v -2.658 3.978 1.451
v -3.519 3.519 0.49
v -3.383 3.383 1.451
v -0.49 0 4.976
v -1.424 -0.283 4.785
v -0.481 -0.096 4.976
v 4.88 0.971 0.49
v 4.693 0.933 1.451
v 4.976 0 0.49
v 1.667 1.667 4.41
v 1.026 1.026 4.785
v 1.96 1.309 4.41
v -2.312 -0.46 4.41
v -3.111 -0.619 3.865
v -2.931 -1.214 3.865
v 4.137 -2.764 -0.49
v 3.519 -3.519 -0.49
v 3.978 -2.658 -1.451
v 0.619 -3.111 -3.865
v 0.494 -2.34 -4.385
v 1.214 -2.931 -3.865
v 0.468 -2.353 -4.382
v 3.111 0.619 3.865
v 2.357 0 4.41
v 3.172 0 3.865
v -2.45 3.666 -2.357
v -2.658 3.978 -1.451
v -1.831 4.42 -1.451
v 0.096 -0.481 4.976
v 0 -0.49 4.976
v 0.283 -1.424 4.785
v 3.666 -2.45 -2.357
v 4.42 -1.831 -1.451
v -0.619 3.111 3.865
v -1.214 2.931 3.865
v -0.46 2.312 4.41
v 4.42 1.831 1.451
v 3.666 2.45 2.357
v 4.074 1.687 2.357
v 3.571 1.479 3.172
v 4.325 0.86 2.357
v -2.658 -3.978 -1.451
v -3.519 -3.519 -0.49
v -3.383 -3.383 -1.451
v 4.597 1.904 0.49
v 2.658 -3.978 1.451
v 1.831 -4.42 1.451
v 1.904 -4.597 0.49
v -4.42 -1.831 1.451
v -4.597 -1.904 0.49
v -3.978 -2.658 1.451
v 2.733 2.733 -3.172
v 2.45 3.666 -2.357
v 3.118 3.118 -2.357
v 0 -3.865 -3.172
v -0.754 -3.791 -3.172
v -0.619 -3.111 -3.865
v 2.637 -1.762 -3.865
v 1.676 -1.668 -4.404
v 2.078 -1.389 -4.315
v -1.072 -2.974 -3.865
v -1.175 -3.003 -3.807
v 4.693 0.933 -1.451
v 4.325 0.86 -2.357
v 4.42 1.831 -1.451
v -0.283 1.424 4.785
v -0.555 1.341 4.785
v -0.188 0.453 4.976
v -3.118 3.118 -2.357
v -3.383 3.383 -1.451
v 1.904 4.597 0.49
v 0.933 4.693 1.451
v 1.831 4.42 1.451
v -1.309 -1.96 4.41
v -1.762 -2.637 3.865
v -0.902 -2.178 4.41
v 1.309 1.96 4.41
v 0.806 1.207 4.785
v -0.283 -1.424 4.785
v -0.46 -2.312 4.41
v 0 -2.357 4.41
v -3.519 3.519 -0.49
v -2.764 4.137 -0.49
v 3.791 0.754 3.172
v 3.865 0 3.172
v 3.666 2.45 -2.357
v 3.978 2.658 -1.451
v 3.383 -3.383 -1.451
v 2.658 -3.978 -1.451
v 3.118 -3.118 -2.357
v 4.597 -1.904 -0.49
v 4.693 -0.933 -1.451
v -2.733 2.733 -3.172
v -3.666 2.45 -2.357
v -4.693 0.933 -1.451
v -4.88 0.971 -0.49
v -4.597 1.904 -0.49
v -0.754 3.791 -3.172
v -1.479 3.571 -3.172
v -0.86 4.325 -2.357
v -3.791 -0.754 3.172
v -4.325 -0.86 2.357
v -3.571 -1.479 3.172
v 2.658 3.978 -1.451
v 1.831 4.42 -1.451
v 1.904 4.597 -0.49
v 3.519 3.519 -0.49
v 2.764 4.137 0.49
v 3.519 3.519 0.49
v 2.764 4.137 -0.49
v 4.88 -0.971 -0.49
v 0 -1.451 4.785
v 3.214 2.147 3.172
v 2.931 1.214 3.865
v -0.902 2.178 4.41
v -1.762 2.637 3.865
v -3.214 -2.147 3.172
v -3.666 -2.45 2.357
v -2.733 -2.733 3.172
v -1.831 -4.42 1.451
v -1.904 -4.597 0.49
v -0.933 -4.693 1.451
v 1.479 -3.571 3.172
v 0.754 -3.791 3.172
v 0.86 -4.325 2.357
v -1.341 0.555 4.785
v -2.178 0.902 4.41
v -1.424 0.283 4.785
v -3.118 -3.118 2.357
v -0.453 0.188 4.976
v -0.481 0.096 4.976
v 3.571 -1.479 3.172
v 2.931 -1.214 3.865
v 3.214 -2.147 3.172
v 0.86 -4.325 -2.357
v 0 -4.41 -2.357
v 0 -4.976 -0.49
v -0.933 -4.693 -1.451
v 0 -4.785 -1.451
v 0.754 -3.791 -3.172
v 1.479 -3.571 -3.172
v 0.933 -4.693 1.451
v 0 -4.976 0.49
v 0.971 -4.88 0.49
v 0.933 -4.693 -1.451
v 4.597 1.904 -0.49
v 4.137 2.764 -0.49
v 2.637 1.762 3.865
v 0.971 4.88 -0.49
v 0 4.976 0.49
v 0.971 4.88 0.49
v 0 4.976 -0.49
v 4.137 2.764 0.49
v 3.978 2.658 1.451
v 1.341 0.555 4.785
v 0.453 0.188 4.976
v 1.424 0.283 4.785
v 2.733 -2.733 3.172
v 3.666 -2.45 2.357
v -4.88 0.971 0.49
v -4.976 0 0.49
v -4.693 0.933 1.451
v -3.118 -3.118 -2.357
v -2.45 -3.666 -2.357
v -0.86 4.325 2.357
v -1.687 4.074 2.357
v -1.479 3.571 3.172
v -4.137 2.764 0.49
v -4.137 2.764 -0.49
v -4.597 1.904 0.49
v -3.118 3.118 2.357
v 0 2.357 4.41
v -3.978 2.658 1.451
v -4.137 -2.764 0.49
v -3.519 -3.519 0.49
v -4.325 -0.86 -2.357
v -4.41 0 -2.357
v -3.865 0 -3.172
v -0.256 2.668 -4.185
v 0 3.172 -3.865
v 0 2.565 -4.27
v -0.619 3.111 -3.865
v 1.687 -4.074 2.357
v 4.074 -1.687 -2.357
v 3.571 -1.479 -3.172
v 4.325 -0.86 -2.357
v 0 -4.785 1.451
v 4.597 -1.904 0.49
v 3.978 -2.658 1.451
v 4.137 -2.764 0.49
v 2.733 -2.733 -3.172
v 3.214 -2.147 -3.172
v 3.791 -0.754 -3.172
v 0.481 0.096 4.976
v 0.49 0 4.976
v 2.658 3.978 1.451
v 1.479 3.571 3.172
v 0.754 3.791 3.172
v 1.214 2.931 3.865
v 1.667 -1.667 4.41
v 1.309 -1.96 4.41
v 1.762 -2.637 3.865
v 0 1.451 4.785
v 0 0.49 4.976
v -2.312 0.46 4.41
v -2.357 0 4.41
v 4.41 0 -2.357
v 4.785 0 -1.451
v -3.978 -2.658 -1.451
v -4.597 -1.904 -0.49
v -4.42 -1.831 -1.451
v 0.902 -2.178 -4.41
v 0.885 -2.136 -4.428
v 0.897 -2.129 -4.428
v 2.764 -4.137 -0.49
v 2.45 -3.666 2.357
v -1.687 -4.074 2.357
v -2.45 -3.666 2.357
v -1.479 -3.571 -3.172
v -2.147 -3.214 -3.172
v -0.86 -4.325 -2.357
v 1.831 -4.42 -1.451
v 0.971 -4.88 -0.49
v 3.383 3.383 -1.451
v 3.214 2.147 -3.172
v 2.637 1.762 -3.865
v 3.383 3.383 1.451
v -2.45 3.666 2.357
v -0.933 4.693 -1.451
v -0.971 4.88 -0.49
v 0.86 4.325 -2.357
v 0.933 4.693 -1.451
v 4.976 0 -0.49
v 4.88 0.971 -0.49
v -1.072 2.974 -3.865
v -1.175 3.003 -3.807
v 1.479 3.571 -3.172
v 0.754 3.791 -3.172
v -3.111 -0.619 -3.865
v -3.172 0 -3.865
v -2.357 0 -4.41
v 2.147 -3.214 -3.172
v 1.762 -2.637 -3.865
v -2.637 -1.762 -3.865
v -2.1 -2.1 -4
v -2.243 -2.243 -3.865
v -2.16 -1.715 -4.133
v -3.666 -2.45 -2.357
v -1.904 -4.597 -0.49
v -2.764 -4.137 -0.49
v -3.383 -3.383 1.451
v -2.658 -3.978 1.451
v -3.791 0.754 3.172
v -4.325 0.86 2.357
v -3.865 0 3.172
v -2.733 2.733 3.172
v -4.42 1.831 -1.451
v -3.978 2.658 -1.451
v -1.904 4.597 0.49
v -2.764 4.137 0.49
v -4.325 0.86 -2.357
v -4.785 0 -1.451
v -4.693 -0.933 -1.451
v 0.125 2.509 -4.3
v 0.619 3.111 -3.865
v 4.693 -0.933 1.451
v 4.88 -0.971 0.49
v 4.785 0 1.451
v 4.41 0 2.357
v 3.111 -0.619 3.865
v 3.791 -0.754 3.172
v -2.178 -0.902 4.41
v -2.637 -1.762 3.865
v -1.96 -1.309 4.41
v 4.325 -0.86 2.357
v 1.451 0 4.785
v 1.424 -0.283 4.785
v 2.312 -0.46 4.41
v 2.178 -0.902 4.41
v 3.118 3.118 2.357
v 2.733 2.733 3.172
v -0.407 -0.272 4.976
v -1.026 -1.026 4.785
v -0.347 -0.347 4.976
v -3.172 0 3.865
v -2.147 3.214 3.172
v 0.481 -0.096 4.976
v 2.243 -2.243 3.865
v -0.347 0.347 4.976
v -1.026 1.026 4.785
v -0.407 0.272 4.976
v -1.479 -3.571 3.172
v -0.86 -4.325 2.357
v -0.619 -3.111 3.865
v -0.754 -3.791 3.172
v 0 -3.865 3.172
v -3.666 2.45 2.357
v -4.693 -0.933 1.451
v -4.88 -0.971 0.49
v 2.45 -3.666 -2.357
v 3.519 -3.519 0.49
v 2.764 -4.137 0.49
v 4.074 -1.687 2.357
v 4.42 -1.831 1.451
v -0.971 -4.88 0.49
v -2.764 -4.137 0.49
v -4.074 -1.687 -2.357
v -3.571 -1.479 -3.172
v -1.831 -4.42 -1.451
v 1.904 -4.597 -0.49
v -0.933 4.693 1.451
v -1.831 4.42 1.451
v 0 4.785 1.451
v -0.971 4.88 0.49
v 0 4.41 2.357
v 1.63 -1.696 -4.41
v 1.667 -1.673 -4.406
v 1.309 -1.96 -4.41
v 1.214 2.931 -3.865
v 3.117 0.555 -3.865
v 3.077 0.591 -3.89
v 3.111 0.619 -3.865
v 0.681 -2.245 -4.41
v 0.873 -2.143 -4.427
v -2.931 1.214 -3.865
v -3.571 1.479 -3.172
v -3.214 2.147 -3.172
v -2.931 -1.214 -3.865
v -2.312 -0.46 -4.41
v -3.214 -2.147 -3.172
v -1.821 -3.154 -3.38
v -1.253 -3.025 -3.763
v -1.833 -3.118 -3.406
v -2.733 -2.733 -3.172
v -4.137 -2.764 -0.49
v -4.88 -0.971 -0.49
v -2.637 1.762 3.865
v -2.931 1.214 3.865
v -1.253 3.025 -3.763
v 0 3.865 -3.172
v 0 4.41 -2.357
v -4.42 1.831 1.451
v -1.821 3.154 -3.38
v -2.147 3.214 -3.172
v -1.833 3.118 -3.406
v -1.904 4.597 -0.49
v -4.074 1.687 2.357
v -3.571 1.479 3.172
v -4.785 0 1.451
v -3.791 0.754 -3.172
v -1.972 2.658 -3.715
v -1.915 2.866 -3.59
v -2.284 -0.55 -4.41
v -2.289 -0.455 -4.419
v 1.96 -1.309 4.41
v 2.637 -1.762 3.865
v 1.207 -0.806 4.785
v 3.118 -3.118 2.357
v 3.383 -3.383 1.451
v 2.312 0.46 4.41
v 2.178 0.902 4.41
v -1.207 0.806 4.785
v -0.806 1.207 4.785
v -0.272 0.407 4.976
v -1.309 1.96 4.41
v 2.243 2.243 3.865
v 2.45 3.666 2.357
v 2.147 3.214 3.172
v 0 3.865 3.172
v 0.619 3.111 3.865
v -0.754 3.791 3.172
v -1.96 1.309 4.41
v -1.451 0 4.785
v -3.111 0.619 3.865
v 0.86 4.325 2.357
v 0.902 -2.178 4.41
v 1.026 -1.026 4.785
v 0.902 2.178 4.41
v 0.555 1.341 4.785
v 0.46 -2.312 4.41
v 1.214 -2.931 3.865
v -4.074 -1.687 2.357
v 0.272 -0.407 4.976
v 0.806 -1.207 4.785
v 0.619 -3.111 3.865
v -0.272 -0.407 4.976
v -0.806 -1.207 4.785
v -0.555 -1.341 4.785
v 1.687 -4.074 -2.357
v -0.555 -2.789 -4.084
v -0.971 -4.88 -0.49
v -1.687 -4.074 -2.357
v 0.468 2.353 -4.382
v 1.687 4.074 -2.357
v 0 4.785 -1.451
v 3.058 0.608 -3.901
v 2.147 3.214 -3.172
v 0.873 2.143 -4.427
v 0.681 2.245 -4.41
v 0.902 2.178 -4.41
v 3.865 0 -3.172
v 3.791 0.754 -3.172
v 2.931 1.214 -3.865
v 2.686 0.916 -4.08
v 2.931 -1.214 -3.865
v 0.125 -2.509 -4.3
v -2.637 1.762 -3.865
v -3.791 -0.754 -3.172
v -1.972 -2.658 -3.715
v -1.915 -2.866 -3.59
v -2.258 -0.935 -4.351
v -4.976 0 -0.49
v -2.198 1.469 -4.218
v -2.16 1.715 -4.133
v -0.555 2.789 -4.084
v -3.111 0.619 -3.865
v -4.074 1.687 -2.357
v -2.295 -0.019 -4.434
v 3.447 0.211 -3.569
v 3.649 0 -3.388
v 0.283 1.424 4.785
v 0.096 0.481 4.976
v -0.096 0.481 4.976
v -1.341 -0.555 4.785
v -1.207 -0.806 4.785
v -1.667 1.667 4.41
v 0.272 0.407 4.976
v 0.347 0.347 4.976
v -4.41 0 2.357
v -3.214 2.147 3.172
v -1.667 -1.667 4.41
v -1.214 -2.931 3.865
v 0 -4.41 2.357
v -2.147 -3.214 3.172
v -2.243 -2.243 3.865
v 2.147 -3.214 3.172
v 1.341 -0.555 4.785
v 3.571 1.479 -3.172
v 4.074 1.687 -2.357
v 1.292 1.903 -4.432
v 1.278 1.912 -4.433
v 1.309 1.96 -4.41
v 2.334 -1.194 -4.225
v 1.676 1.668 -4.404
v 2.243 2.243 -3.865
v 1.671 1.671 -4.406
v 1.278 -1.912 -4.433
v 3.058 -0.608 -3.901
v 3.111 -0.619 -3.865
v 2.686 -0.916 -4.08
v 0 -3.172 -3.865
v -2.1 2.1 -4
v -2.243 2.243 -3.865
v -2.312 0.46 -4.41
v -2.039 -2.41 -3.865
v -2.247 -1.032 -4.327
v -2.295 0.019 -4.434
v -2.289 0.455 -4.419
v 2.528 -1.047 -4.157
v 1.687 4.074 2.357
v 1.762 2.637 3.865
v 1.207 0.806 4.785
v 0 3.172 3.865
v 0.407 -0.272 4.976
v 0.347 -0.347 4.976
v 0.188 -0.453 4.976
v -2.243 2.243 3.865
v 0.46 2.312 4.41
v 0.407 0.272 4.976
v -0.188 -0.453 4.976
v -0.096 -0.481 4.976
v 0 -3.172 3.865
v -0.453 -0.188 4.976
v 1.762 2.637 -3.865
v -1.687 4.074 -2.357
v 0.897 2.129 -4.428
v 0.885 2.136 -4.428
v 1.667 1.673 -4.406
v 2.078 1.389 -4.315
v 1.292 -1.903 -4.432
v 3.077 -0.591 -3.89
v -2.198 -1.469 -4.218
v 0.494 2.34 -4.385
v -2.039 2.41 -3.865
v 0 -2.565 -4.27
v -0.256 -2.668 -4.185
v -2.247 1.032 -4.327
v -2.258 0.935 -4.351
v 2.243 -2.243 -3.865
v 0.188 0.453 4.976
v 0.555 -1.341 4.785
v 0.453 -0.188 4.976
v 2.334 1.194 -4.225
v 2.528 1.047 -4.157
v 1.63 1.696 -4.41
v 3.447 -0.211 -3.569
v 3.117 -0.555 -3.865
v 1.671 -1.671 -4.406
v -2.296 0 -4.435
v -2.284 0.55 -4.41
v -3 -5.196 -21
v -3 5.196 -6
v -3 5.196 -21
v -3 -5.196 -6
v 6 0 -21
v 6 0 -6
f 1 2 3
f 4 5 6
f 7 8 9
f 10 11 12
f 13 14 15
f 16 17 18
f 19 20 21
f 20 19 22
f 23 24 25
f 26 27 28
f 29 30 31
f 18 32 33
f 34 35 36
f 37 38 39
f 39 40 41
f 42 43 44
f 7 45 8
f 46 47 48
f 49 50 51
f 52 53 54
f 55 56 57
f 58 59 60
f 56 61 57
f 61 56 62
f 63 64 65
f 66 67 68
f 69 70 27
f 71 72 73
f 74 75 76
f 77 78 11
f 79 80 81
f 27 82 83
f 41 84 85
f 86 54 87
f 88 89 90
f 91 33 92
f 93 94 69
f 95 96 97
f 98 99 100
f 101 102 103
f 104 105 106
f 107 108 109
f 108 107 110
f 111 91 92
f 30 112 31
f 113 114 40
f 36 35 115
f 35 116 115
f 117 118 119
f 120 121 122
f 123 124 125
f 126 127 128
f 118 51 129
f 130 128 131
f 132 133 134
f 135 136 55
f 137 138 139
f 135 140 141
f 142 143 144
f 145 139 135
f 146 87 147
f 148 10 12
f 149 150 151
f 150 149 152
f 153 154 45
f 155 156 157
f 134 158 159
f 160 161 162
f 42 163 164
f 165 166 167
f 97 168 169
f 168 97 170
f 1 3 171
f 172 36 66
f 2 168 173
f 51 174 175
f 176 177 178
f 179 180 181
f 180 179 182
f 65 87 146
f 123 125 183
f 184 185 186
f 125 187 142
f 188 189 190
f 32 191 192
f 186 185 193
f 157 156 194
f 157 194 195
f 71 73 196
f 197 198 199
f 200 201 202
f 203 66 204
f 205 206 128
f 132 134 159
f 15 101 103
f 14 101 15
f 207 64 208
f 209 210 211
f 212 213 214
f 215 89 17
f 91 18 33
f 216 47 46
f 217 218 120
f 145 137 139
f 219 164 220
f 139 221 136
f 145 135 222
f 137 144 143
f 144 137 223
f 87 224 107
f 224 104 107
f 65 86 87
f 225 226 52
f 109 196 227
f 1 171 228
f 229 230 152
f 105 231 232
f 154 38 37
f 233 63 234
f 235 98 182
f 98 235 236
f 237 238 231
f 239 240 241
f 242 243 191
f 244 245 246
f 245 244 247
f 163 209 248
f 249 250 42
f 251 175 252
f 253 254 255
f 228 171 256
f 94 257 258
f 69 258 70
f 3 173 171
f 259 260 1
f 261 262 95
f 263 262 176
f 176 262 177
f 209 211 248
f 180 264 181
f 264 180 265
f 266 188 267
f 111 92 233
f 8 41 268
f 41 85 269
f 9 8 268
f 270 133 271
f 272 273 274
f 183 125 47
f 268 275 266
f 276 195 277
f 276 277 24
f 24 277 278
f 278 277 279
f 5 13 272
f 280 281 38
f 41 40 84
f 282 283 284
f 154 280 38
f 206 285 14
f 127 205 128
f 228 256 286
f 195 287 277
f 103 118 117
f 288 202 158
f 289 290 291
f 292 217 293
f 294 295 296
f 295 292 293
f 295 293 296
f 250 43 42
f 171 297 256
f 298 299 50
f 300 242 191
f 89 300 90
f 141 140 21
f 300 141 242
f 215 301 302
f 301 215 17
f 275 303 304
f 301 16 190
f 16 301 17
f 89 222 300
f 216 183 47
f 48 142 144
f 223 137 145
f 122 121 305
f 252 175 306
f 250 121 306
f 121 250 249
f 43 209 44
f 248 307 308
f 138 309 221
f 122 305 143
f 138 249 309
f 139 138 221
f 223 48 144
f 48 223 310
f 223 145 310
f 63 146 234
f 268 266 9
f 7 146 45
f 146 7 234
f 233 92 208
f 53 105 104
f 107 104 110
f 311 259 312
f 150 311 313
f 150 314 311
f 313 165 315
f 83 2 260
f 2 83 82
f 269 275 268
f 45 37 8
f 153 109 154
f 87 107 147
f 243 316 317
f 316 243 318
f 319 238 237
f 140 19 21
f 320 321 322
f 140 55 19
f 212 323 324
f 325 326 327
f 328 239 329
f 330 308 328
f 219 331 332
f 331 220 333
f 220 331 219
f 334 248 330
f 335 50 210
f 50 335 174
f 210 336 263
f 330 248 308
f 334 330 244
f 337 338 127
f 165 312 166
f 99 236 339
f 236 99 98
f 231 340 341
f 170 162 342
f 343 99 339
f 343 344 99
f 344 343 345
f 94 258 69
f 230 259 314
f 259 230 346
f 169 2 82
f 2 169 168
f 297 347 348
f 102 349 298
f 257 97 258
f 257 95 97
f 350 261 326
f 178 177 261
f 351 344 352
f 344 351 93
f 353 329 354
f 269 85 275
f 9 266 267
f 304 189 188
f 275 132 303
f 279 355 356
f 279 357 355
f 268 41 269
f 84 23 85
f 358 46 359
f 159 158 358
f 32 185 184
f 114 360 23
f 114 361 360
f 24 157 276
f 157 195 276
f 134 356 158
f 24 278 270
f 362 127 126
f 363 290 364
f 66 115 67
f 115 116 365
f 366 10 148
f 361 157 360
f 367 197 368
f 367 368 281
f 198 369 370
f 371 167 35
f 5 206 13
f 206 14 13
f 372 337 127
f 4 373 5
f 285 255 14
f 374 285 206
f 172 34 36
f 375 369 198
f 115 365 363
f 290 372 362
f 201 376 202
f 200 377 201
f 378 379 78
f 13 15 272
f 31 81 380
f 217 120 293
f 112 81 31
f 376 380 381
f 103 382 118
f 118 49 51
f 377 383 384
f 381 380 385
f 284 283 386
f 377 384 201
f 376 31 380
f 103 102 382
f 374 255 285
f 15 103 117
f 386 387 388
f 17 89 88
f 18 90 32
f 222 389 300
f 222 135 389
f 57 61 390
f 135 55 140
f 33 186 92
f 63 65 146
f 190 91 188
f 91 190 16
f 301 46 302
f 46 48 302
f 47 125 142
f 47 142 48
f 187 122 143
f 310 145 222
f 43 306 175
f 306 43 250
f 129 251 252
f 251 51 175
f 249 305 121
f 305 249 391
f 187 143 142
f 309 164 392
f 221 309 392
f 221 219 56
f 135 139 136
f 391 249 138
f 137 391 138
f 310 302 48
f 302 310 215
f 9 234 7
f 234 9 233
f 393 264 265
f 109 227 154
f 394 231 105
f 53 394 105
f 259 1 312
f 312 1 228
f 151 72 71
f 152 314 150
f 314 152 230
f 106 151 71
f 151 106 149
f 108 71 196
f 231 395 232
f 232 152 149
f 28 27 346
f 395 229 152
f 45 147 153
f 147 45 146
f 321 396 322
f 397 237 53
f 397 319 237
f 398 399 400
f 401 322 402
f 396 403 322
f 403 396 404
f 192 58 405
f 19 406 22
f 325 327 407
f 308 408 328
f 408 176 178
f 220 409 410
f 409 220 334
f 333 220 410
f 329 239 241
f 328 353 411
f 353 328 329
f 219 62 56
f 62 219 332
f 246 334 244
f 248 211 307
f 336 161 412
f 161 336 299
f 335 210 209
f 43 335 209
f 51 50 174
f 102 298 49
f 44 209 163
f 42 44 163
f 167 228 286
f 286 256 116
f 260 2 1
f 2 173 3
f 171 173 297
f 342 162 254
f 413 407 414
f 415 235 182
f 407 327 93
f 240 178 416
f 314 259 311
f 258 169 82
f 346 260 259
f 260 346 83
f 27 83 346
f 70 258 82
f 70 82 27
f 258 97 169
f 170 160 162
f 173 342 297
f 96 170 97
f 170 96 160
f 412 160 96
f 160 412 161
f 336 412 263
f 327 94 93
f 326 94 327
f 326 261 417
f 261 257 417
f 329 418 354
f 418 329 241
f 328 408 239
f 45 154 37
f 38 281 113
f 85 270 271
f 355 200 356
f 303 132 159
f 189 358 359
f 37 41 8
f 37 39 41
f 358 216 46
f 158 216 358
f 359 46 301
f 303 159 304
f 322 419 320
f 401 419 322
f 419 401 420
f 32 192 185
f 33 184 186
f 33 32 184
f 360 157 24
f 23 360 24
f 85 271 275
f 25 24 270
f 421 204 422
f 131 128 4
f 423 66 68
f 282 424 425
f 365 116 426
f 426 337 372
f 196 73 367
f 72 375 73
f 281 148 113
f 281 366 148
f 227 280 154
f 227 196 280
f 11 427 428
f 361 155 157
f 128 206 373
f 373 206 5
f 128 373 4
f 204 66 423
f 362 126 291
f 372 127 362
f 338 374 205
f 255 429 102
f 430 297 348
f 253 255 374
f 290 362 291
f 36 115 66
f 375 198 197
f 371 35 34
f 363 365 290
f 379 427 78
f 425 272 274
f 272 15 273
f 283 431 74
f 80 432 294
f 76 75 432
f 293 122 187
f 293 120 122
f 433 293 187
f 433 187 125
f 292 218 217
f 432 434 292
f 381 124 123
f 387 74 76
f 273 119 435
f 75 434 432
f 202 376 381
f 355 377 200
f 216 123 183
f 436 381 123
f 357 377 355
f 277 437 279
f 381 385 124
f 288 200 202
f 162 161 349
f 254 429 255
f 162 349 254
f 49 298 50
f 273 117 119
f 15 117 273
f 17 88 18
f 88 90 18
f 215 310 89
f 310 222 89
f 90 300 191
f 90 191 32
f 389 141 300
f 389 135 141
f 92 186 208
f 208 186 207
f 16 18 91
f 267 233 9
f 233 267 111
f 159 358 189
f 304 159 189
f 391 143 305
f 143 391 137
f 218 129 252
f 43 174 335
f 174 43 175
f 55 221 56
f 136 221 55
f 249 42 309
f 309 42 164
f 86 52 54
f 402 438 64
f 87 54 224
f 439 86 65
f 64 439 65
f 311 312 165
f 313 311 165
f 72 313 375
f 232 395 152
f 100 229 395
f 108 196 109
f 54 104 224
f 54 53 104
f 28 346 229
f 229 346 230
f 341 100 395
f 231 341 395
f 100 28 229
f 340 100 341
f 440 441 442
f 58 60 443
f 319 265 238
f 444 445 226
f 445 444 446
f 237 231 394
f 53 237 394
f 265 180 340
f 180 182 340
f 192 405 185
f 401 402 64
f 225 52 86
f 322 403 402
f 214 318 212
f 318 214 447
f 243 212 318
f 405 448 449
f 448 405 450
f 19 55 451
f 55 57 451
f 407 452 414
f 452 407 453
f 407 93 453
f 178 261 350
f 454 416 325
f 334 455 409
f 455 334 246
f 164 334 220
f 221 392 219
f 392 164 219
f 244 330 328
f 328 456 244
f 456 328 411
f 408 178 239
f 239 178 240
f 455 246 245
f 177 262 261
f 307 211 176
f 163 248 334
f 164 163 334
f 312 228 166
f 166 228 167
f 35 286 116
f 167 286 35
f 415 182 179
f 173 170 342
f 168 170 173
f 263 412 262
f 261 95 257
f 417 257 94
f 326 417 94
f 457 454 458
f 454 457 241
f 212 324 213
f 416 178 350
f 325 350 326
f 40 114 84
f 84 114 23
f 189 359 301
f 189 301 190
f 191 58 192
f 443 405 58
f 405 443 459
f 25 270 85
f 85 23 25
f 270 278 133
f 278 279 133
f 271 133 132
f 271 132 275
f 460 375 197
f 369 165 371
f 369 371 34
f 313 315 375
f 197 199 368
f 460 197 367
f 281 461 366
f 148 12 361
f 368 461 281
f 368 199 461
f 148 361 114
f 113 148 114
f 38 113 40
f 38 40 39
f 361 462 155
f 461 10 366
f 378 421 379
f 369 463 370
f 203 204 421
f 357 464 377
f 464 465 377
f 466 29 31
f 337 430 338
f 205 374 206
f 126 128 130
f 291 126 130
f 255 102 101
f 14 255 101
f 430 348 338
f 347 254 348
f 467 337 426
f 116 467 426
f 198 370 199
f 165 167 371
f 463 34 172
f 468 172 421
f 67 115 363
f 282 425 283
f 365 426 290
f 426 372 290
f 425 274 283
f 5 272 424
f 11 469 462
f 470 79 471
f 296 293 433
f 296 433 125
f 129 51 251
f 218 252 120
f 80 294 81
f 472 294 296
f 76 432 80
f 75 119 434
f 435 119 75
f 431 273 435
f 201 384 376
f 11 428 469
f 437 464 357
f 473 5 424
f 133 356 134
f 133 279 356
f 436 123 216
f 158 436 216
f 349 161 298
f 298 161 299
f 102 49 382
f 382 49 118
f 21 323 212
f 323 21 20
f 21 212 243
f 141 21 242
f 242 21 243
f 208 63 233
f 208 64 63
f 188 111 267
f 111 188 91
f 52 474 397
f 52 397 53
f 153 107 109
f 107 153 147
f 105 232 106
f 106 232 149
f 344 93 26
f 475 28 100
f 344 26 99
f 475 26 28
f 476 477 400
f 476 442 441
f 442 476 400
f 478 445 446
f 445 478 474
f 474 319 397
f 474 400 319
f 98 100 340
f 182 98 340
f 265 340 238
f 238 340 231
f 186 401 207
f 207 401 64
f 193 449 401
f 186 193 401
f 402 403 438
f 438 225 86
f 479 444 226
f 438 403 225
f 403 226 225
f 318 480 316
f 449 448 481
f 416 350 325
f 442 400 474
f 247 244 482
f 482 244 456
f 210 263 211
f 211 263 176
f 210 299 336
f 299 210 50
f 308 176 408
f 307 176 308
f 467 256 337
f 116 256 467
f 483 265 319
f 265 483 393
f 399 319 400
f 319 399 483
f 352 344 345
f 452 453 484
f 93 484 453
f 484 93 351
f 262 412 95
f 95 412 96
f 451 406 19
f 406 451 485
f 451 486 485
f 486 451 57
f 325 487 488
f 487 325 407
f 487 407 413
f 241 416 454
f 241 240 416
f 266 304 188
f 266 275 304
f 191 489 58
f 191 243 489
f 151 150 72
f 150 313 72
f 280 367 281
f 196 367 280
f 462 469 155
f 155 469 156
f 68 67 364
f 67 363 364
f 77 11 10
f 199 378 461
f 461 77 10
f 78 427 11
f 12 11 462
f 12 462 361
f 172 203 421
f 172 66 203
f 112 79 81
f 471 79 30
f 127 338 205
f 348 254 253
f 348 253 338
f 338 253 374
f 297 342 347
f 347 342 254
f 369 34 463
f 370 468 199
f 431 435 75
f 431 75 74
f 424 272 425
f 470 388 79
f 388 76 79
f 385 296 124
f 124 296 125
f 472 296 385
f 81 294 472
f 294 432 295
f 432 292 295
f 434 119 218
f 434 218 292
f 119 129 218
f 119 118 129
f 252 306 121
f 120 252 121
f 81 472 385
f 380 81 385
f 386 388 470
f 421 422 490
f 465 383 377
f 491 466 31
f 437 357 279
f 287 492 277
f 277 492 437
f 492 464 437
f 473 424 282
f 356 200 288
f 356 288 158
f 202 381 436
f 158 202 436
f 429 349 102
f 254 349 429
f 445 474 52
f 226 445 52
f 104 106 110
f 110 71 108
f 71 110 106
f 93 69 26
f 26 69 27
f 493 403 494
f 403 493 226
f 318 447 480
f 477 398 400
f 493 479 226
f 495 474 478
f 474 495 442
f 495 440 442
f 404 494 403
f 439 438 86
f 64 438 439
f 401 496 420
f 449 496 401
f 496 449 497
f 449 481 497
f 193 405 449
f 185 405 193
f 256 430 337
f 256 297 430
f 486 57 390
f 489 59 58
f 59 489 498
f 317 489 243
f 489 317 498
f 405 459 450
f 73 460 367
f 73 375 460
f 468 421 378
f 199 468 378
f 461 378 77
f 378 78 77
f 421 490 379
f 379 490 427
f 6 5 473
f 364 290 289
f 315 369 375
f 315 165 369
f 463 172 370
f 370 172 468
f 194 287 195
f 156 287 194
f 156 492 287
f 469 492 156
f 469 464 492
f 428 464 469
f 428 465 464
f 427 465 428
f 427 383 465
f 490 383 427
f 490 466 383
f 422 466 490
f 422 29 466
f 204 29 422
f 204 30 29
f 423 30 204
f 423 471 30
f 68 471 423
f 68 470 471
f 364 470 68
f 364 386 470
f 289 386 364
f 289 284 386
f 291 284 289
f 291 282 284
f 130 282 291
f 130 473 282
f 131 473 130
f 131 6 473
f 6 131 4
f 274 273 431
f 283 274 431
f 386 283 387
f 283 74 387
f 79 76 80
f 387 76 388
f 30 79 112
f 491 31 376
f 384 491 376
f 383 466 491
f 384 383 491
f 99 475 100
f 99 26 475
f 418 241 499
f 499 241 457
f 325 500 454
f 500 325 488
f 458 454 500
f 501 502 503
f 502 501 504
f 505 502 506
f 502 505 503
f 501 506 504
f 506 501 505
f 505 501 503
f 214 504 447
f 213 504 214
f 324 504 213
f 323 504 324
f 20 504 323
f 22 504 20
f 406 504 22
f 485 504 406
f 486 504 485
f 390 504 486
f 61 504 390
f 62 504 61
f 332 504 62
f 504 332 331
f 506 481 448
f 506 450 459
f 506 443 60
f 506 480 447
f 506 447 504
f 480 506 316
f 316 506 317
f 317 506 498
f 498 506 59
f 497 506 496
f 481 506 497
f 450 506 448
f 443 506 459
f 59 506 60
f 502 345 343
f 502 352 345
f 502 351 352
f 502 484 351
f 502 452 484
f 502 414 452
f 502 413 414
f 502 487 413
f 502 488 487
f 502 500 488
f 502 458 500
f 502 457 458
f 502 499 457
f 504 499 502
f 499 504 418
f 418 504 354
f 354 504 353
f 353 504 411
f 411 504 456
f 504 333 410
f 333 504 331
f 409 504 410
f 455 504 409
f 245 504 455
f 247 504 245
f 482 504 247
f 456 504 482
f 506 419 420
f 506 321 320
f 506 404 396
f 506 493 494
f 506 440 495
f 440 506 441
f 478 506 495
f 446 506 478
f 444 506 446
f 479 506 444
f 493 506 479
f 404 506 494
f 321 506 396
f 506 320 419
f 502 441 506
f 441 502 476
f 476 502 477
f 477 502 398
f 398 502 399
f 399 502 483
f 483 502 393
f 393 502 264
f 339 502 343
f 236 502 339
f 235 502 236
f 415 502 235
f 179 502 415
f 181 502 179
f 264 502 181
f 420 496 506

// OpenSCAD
car_len=65;
car_wid=30;
car_h=15;
axle_wid=10;
axle_correction=0.26;
seat_widx=14;
seat_widy=12;
tolerance=0.25;

$fn=32;


module peg(rotation) {
  rotate([-90,rotation,0]) {
  sphere(5);
  c=6; 
  translate([0,0,-21])
    cylinder(r=c, h=15, $fn=3);
  translate([0,0,-6])
    linear_extrude(height=6, scale=0.1)
      circle(r=c,  $fn=3);
/*  mirror([0,0,1])
    linear_extrude(height=5, scale=0.1)
      circle(r=c,  $fn=3);*/
}}

rotate([90,0,0])
peg();
